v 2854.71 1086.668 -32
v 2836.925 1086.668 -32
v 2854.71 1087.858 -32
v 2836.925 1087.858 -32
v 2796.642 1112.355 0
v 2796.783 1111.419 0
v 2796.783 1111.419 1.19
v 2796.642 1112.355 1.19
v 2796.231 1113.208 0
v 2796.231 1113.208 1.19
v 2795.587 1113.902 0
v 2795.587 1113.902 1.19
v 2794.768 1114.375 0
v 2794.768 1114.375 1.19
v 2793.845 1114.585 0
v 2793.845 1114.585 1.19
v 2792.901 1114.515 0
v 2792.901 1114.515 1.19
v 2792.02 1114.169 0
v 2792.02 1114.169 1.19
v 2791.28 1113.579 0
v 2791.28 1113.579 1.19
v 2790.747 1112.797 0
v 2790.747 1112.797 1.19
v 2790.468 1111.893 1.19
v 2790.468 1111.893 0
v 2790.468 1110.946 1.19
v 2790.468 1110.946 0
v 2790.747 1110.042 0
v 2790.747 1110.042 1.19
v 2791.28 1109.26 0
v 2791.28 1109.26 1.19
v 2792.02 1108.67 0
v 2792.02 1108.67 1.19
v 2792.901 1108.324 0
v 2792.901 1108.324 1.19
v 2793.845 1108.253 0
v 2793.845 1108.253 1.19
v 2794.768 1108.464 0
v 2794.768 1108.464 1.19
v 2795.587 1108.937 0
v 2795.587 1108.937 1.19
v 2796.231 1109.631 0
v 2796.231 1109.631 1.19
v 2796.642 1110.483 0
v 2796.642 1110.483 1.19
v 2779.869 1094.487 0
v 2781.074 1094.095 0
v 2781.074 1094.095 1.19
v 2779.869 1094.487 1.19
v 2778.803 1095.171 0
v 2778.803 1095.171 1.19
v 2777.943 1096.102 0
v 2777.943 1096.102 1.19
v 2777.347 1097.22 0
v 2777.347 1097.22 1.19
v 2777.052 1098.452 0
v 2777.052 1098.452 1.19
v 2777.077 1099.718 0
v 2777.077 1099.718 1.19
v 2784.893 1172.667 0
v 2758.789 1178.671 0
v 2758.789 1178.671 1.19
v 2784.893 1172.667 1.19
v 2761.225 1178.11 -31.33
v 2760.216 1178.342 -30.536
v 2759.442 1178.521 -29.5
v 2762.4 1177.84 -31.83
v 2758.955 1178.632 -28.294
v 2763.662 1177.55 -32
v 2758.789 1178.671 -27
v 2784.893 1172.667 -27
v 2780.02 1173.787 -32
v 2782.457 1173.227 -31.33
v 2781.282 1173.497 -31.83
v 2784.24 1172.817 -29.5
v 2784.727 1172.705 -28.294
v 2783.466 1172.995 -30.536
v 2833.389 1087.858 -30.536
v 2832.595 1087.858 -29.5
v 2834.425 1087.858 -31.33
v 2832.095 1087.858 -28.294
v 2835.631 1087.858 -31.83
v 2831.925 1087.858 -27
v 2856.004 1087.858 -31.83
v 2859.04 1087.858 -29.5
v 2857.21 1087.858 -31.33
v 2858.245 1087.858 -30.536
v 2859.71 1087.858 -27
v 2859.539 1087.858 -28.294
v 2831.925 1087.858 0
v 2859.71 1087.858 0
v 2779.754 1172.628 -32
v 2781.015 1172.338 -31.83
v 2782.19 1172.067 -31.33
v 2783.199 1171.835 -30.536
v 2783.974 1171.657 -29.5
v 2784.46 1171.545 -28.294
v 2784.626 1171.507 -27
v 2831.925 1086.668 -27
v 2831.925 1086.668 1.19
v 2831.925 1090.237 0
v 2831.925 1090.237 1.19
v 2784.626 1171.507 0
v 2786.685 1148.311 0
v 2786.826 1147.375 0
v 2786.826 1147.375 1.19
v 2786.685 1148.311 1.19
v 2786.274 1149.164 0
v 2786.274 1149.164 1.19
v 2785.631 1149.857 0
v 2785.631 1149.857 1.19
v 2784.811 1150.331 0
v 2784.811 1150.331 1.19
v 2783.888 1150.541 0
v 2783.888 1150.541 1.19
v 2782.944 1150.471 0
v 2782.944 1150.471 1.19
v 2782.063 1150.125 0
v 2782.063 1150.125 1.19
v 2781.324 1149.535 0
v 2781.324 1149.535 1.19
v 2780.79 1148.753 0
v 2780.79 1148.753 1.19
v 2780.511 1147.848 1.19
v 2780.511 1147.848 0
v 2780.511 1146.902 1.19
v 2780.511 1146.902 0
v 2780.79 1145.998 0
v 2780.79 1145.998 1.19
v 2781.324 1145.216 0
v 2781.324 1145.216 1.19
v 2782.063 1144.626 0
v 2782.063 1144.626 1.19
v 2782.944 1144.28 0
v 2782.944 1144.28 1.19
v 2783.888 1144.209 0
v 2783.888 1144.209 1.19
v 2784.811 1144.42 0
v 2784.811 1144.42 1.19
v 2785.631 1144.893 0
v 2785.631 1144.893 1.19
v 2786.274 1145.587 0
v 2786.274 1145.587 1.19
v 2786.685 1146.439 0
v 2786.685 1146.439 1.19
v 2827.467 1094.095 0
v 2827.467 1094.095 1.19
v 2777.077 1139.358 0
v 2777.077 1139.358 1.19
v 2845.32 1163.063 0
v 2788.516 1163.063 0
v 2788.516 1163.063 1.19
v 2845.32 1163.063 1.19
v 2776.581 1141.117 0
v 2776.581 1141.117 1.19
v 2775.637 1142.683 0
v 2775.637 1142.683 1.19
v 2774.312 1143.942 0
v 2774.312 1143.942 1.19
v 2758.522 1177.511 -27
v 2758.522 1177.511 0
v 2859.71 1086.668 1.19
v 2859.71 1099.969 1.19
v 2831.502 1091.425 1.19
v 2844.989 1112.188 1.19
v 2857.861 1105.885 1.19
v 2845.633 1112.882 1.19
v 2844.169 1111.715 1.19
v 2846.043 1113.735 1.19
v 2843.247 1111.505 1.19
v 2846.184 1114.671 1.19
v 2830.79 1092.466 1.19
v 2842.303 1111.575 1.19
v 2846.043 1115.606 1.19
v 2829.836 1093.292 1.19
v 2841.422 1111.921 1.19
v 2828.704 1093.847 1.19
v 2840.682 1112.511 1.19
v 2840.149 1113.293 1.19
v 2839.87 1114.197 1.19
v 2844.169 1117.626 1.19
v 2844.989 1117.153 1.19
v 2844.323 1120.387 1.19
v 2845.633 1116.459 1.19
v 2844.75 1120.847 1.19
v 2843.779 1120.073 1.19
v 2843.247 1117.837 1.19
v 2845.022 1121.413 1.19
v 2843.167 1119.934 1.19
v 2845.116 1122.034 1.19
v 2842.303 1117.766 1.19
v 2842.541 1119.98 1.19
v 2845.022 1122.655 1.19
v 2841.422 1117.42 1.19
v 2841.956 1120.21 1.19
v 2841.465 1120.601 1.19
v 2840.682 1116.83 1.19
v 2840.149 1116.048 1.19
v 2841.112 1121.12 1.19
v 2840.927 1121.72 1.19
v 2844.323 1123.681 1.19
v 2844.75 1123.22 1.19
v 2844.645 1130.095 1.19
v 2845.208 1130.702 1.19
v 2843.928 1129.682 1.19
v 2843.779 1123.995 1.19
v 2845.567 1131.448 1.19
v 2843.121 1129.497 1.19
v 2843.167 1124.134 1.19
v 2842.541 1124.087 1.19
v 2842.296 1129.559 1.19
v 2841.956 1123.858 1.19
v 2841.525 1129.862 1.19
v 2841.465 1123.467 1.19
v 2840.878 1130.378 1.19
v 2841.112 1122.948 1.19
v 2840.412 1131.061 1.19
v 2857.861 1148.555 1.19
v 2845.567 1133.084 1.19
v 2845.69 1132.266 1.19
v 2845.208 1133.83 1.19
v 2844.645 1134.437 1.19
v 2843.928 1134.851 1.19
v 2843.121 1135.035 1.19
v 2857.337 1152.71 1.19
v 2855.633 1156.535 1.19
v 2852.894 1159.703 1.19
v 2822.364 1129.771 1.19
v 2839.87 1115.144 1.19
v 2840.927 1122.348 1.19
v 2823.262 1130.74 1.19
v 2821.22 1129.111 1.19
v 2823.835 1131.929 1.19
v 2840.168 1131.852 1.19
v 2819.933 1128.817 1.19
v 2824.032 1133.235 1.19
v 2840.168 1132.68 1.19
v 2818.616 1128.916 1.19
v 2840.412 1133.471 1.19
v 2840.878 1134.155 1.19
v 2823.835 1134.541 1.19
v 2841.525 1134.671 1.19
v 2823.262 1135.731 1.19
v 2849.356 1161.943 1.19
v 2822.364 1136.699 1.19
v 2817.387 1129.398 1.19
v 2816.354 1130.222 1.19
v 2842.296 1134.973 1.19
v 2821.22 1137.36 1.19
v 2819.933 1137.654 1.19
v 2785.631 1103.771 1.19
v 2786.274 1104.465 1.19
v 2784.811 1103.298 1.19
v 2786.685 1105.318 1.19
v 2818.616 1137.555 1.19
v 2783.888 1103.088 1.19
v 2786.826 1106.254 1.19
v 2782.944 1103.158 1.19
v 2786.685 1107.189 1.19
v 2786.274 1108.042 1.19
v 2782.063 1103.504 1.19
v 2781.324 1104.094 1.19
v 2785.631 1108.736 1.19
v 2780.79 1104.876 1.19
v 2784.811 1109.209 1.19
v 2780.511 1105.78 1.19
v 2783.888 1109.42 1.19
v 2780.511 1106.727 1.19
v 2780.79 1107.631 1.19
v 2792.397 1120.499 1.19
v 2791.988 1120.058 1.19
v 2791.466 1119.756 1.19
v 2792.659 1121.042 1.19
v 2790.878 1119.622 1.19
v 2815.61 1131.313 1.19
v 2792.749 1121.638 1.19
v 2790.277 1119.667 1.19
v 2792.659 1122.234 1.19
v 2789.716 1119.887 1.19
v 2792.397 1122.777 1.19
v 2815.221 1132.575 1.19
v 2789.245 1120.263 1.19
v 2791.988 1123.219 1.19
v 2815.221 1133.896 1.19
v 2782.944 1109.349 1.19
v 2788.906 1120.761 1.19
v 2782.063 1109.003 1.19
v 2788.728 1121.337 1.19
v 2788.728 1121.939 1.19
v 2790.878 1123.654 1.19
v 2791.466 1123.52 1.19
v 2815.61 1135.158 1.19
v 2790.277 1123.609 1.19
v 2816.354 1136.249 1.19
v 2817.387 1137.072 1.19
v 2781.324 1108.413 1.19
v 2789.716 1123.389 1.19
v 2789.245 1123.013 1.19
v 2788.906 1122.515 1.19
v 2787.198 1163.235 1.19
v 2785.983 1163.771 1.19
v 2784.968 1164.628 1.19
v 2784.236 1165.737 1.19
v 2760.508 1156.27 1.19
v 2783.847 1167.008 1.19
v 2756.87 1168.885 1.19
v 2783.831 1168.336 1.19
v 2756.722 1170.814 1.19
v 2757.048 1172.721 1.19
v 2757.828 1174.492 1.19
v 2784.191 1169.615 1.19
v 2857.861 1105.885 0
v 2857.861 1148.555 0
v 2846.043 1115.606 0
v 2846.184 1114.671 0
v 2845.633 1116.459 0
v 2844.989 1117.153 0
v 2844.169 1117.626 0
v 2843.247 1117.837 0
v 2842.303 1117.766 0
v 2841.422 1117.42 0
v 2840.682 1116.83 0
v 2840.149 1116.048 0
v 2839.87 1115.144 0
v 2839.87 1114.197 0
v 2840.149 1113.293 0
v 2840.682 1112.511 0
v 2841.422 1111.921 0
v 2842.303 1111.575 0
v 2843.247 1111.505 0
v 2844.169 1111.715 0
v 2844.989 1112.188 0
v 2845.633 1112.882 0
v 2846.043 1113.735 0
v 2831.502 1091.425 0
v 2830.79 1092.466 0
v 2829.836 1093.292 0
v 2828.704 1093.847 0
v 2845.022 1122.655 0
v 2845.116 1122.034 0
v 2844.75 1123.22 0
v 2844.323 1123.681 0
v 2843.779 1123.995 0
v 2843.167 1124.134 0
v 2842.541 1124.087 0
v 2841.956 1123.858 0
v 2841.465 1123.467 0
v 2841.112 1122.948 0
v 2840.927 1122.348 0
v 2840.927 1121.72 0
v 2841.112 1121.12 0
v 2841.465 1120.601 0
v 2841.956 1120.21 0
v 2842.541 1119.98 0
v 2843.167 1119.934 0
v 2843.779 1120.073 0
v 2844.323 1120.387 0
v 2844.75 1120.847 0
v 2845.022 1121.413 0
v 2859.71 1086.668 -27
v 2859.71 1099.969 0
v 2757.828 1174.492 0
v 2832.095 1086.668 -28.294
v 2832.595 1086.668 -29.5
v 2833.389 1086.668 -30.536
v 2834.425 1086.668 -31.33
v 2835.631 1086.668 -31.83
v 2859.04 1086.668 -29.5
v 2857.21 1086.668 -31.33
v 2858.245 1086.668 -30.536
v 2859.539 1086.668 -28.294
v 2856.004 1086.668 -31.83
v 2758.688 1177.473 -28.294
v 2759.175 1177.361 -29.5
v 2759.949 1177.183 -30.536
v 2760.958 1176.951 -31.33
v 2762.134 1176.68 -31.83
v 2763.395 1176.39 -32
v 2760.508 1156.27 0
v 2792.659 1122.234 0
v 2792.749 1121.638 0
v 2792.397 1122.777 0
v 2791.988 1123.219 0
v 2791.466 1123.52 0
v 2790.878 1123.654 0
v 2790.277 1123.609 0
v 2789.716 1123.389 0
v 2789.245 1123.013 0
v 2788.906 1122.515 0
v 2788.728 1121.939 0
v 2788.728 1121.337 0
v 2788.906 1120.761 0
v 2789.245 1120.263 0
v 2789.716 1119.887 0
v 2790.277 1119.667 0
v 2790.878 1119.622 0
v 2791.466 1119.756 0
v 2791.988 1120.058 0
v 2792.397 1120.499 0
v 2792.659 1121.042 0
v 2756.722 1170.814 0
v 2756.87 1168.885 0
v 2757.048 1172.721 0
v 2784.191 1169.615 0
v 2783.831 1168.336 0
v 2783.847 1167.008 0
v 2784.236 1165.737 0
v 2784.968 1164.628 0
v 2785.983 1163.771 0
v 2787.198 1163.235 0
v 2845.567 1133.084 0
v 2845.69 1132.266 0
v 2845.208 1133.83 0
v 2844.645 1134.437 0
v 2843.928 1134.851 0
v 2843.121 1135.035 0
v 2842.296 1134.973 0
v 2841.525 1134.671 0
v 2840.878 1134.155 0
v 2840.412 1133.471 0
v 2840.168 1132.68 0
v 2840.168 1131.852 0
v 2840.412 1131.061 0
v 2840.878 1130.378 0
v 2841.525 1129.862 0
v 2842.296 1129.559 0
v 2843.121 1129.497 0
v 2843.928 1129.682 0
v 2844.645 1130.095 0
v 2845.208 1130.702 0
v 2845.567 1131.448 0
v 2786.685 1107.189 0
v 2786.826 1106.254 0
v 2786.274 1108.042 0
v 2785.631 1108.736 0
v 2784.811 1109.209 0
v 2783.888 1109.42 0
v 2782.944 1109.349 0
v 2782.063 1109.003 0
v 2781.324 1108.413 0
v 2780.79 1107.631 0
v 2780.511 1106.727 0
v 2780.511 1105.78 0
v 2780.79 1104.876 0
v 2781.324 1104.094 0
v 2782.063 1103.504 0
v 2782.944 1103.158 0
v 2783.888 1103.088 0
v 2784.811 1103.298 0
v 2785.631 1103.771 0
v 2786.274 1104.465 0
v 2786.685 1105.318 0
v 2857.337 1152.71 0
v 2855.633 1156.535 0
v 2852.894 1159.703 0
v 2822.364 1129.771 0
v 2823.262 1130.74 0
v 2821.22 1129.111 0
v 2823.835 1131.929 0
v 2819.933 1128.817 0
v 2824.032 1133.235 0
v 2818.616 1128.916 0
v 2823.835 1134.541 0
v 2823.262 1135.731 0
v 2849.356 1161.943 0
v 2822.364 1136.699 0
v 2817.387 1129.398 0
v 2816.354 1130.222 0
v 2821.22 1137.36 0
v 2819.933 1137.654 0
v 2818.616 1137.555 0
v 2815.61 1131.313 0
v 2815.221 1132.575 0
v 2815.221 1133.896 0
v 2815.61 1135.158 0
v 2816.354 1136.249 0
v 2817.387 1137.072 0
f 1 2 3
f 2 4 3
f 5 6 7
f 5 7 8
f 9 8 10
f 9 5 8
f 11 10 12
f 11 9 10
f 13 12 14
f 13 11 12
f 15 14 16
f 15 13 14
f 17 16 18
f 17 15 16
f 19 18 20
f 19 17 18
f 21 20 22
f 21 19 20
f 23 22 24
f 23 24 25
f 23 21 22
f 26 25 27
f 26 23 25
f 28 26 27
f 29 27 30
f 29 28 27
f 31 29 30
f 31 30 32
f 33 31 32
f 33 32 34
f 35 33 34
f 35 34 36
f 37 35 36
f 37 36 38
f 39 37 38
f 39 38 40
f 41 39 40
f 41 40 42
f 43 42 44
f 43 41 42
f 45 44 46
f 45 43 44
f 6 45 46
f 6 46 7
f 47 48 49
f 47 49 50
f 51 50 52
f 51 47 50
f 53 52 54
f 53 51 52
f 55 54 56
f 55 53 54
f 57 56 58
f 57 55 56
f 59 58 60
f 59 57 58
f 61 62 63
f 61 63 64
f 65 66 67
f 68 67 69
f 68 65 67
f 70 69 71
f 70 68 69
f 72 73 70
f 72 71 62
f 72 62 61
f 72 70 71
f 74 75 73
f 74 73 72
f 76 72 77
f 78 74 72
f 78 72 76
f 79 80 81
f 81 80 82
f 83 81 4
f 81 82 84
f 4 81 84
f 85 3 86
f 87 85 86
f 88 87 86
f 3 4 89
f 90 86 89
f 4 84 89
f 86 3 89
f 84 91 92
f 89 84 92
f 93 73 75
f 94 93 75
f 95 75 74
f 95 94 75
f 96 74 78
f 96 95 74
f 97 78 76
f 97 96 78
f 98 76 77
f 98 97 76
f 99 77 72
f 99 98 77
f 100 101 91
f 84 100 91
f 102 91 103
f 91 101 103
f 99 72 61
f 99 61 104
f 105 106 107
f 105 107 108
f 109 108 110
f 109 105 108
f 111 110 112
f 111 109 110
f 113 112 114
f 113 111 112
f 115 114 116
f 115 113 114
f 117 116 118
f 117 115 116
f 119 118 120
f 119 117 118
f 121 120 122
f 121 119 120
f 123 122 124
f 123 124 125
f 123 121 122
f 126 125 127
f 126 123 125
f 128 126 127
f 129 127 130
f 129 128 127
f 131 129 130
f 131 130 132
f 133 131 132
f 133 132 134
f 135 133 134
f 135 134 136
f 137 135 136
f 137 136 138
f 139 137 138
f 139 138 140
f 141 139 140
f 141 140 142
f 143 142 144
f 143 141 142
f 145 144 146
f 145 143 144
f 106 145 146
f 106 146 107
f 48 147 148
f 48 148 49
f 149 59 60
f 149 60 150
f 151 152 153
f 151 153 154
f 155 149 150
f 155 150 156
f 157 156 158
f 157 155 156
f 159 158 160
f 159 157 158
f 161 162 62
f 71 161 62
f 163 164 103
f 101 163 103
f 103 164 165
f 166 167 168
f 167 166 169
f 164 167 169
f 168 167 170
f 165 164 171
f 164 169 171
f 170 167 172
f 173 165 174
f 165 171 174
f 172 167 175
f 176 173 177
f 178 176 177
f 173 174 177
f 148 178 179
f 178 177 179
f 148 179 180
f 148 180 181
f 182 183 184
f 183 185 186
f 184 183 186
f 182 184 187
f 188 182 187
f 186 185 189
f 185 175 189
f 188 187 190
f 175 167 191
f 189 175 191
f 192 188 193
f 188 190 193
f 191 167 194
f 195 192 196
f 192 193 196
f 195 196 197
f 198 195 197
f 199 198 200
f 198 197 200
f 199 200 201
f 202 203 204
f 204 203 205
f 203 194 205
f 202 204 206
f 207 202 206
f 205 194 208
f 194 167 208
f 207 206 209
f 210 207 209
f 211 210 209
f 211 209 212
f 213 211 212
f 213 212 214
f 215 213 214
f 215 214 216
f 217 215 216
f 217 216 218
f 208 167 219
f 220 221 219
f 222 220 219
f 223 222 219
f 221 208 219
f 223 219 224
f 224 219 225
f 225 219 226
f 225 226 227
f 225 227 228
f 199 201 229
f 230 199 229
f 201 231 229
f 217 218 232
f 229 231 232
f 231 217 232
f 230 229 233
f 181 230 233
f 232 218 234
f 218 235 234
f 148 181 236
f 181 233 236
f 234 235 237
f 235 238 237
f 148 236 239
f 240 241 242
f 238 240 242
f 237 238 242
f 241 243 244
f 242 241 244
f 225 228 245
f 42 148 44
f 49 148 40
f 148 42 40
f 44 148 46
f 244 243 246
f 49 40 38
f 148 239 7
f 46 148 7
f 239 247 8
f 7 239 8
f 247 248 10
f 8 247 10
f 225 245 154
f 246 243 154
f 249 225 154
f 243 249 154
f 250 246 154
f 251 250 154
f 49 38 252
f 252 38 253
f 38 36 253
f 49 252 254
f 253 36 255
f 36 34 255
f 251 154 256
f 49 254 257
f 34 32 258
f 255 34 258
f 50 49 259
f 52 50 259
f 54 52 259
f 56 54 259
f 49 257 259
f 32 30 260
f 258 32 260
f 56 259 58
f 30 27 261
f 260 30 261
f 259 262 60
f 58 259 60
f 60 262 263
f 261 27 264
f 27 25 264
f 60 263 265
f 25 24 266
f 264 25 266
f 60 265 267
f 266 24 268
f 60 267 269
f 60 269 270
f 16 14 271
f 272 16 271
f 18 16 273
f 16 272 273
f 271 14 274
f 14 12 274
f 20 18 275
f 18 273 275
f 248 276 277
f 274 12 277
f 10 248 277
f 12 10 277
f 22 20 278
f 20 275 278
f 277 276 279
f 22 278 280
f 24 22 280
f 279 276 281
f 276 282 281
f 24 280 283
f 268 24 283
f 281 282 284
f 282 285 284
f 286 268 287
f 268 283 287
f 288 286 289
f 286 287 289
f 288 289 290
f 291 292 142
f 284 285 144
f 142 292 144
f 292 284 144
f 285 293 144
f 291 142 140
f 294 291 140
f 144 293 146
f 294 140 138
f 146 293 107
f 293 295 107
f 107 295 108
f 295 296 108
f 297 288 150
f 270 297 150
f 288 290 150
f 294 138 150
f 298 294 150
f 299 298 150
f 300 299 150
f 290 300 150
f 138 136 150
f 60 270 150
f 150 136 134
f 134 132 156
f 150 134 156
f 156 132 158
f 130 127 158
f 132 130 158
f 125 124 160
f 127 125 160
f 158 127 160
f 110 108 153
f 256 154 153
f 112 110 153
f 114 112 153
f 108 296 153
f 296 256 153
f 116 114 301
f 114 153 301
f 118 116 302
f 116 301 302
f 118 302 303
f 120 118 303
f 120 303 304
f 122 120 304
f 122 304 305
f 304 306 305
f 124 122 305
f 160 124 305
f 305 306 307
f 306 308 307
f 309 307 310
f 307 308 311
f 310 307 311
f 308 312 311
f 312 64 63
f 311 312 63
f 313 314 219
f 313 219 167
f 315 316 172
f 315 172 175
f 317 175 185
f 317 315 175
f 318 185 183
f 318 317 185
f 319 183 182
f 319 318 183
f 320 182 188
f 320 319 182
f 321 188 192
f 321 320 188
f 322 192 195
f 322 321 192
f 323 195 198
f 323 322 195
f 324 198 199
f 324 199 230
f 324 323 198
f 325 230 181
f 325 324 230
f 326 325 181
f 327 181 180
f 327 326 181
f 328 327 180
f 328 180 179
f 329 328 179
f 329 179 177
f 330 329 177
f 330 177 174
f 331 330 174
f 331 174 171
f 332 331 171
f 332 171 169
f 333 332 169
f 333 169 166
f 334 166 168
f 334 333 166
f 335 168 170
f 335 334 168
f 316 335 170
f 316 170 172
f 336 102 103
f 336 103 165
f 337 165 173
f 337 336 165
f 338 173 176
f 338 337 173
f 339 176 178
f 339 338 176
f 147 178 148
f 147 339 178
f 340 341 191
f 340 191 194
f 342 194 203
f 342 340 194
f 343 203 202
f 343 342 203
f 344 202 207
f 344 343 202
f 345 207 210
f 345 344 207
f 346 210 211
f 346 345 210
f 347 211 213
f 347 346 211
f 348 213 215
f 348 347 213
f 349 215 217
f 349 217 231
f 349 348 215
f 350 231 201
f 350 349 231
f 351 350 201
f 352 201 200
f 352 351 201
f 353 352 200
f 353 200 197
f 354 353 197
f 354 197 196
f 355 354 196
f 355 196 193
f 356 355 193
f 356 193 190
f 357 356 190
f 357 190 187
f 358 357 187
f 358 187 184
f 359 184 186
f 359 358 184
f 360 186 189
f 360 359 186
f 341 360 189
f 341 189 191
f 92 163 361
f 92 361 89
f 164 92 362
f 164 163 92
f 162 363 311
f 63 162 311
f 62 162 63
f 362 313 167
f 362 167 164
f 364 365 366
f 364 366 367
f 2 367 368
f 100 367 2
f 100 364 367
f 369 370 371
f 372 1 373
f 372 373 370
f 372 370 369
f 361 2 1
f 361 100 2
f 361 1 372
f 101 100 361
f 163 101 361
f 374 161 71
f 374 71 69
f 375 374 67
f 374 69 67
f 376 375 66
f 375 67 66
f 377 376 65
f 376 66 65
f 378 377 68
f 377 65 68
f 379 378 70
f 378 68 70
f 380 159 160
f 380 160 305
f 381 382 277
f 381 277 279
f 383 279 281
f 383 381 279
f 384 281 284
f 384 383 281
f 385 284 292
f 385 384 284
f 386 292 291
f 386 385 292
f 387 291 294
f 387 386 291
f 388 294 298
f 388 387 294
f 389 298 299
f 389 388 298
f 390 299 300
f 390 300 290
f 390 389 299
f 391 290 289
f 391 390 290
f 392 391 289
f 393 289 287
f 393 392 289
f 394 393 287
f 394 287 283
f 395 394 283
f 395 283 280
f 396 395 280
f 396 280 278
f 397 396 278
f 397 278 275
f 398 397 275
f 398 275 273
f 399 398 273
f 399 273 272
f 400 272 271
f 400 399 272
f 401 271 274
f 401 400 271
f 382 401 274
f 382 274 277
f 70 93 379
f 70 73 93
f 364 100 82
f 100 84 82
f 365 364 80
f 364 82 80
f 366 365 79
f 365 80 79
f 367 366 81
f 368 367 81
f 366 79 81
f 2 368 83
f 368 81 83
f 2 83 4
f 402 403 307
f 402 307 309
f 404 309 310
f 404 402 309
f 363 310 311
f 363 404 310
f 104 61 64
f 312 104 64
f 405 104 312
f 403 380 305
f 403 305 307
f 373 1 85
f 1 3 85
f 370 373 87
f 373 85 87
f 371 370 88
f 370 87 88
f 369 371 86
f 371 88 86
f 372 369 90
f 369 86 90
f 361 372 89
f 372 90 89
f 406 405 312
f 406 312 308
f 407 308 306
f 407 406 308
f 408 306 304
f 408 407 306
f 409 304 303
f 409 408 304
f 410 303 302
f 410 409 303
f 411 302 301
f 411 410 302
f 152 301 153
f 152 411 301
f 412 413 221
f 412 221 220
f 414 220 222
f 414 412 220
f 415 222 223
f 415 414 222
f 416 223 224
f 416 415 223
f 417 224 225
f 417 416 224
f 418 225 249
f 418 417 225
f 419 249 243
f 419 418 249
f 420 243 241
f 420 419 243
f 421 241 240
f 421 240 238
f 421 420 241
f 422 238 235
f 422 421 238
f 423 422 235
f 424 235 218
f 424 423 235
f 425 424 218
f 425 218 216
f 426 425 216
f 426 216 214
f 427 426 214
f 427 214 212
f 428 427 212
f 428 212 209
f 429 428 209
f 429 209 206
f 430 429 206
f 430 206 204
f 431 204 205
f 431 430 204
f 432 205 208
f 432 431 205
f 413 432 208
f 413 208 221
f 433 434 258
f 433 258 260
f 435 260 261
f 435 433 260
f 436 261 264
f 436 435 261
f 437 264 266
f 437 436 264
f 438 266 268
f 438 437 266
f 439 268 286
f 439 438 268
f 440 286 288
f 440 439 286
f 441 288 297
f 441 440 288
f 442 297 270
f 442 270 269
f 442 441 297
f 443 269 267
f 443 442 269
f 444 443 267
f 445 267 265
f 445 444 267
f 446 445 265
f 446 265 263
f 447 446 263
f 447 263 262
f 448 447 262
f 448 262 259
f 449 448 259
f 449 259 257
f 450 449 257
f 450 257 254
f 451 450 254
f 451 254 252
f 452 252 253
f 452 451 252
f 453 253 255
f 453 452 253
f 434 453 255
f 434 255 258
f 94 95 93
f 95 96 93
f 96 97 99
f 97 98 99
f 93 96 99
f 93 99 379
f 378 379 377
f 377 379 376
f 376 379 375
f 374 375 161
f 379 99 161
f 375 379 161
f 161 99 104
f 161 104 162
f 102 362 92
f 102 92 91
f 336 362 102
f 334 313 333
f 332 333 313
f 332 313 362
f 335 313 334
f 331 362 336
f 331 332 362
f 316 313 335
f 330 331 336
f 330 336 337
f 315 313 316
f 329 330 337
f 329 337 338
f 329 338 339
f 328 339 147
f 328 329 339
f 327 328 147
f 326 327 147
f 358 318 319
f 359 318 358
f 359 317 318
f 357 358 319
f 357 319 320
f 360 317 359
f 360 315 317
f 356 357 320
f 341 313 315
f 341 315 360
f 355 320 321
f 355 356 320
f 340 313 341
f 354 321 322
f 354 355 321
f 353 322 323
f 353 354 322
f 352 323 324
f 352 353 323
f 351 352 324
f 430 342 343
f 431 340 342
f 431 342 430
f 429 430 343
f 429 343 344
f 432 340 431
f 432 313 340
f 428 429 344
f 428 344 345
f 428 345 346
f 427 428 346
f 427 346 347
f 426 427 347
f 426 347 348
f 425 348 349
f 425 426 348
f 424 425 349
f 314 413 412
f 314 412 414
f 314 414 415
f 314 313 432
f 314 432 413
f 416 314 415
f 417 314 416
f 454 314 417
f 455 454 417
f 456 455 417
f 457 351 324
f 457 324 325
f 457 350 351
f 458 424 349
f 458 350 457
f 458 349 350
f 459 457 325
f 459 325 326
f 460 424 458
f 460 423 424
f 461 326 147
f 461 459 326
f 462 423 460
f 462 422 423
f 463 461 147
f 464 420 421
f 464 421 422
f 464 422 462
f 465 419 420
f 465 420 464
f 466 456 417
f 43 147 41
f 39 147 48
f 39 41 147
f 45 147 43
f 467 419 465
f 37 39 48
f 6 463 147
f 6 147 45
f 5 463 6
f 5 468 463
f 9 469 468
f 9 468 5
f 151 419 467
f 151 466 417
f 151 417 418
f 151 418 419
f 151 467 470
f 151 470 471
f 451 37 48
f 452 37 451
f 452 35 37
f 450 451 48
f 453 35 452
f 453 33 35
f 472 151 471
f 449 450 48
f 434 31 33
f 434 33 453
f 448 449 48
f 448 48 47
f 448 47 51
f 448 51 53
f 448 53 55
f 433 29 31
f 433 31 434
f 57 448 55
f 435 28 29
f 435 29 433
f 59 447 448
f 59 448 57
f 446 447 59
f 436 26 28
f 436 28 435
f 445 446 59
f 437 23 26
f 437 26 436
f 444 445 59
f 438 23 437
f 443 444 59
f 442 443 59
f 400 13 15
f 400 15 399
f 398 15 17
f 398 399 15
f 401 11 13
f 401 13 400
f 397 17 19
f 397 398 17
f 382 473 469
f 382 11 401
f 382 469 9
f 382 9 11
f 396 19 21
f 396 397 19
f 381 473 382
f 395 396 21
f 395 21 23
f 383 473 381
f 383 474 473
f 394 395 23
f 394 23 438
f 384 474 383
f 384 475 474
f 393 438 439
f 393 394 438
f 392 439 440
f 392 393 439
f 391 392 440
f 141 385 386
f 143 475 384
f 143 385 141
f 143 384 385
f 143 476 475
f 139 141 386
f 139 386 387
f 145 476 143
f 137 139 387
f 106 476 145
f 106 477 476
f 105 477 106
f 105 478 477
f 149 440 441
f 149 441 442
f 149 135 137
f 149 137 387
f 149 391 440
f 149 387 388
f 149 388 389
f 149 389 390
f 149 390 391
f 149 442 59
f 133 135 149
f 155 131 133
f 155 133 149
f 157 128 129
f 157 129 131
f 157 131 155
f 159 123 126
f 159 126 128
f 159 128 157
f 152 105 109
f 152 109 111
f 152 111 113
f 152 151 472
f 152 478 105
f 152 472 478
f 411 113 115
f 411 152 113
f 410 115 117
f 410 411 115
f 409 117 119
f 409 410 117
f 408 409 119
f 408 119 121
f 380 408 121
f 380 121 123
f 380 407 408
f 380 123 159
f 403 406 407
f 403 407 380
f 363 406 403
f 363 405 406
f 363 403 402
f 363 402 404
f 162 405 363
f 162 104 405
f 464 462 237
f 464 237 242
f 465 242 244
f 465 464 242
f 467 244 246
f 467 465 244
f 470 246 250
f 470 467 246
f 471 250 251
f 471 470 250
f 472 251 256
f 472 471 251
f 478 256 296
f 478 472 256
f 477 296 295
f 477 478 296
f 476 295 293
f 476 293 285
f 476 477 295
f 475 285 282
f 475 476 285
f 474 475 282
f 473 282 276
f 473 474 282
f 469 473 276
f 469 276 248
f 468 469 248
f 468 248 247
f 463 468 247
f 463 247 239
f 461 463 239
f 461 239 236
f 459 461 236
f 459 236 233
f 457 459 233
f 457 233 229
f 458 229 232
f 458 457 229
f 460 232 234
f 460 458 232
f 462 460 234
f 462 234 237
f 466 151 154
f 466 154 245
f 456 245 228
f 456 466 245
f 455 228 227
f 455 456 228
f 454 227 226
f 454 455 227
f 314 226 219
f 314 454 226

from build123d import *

# Parameters (mm, degrees)
CROQUIS1_R              = 4.430496459
CROQUIS1_R_2            = 2.021537648
CROQUIS1_R_3            = 3.175
CROQUIS1_R_4            = 2.776444448
CROQUIS1_R_5            = 2.106249137
SALIENTE_EXTRUIR1_DEPTH = 1.19
CROQUIS4_W              = 27.78454451
CROQUIS4_H              = 1.19
SALIENTE_EXTRUIR2_DEPTH = 33.19
REDONDEO2_R             = 5


with BuildPart() as part:
    # Croquis1 → Saliente-Extruir1 (new body)
    with BuildSketch(Plane.XY):
        with BuildLine():
            Line((2788.515923591, 1163.062896503), (2845.320282862, 1163.062896503))
            ThreePointArc((2845.320282862, 1163.062896503), (2854.380265752, 1158.219977336), (2857.861371877, 1148.554623946))
            Line((2857.861371877, 1148.554623946), (2857.861371877, 1105.884683704))
            Line((2857.861371877, 1105.884683704), (2859.709564321, 1099.969499723))
            Line((2859.709564321, 1099.969499723), (2859.709564321, 1086.668463787))
            Line((2859.709564321, 1086.668463787), (2831.925019811, 1086.668463787))
            Line((2831.925019811, 1086.668463787), (2831.925019811, 1090.237043102))
            ThreePointArc((2831.925019811, 1090.237043102), (2830.339855276, 1092.909707682), (2827.46732338, 1094.094799688))
            Line((2827.46732338, 1094.094799688), (2781.073788136, 1094.094799688))
            ThreePointArc((2781.073788136, 1094.094799688), (2777.943377157, 1096.10205762), (2777.077273901, 1099.718467781))
            Line((2777.077273901, 1099.718467781), (2777.077273901, 1139.357764533))
            ThreePointArc((2777.077273901, 1139.357764533), (2776.16191908, 1141.931561181), (2774.31245647, 1143.941981956))
            Line((2774.31245647, 1143.941981956), (2760.508490421, 1156.27030536))
            Line((2760.508490421, 1156.27030536), (2756.869619555, 1168.884626052))
            ThreePointArc((2756.869619555, 1168.884626052), (2756.826740412, 1171.777711215), (2757.827792947, 1174.492425601))
            Line((2757.827792947, 1174.492425601), (2758.788780948, 1178.67068333))
            Line((2758.788780948, 1178.67068333), (2784.893128388, 1172.66675387))
            Line((2784.893128388, 1172.66675387), (2784.19129322, 1169.615260811))
            ThreePointArc((2784.19129322, 1169.615260811), (2784.56217485, 1165.156713392), (2788.515923591, 1163.062896503))
        make_face()
        with Locations((2819.601763615, 1133.235396685)):
            Circle(CROQUIS1_R, mode=Mode.SUBTRACT)
        with Locations((2790.727223865, 1121.638053324)):
            Circle(CROQUIS1_R_2, mode=Mode.SUBTRACT)
        with Locations((2783.65094449, 1147.375154376)):
            Circle(CROQUIS1_R_3, mode=Mode.SUBTRACT)
        with Locations((2793.607825607, 1111.419307874)):
            Circle(CROQUIS1_R_3, mode=Mode.SUBTRACT)
        with Locations((2783.65094449, 1106.253651095)):
            Circle(CROQUIS1_R_3, mode=Mode.SUBTRACT)
        with Locations((2842.913546585, 1132.266044758)):
            Circle(CROQUIS1_R_4, mode=Mode.SUBTRACT)
        with Locations((2843.009293559, 1122.033928625)):
            Circle(CROQUIS1_R_5, mode=Mode.SUBTRACT)
        with Locations((2843.009293559, 1114.670632569)):
            Circle(CROQUIS1_R_3, mode=Mode.SUBTRACT)
    extrude(amount=SALIENTE_EXTRUIR1_DEPTH)

    # Croquis4 → Saliente-Extruir2 (add)
    with BuildSketch(Plane.XY.offset(1.19)):
        with Locations((2845.817292066, 1087.263463787)):
            Rectangle(CROQUIS4_W, CROQUIS4_H)
        Polygon((2784.893128388, 1172.66675387), (2784.626395606, 1171.507032515), (2758.522048166, 1177.510961974), (2758.788780948, 1178.67068333), align=None)
    extrude(amount=-SALIENTE_EXTRUIR2_DEPTH)

    # Redondeo2
    redondeo2_edges = [part.edges().sort_by_distance(p)[0] for p in [
        (2784.759761997, 1172.086893193, -32),
        (2758.655414557, 1178.090822652, -32),
        (2831.925019811, 1087.263463787, -32),
        (2859.709564321, 1087.263463787, -32),
    ]]
    fillet(redondeo2_edges, radius=REDONDEO2_R)


solid = part.part
